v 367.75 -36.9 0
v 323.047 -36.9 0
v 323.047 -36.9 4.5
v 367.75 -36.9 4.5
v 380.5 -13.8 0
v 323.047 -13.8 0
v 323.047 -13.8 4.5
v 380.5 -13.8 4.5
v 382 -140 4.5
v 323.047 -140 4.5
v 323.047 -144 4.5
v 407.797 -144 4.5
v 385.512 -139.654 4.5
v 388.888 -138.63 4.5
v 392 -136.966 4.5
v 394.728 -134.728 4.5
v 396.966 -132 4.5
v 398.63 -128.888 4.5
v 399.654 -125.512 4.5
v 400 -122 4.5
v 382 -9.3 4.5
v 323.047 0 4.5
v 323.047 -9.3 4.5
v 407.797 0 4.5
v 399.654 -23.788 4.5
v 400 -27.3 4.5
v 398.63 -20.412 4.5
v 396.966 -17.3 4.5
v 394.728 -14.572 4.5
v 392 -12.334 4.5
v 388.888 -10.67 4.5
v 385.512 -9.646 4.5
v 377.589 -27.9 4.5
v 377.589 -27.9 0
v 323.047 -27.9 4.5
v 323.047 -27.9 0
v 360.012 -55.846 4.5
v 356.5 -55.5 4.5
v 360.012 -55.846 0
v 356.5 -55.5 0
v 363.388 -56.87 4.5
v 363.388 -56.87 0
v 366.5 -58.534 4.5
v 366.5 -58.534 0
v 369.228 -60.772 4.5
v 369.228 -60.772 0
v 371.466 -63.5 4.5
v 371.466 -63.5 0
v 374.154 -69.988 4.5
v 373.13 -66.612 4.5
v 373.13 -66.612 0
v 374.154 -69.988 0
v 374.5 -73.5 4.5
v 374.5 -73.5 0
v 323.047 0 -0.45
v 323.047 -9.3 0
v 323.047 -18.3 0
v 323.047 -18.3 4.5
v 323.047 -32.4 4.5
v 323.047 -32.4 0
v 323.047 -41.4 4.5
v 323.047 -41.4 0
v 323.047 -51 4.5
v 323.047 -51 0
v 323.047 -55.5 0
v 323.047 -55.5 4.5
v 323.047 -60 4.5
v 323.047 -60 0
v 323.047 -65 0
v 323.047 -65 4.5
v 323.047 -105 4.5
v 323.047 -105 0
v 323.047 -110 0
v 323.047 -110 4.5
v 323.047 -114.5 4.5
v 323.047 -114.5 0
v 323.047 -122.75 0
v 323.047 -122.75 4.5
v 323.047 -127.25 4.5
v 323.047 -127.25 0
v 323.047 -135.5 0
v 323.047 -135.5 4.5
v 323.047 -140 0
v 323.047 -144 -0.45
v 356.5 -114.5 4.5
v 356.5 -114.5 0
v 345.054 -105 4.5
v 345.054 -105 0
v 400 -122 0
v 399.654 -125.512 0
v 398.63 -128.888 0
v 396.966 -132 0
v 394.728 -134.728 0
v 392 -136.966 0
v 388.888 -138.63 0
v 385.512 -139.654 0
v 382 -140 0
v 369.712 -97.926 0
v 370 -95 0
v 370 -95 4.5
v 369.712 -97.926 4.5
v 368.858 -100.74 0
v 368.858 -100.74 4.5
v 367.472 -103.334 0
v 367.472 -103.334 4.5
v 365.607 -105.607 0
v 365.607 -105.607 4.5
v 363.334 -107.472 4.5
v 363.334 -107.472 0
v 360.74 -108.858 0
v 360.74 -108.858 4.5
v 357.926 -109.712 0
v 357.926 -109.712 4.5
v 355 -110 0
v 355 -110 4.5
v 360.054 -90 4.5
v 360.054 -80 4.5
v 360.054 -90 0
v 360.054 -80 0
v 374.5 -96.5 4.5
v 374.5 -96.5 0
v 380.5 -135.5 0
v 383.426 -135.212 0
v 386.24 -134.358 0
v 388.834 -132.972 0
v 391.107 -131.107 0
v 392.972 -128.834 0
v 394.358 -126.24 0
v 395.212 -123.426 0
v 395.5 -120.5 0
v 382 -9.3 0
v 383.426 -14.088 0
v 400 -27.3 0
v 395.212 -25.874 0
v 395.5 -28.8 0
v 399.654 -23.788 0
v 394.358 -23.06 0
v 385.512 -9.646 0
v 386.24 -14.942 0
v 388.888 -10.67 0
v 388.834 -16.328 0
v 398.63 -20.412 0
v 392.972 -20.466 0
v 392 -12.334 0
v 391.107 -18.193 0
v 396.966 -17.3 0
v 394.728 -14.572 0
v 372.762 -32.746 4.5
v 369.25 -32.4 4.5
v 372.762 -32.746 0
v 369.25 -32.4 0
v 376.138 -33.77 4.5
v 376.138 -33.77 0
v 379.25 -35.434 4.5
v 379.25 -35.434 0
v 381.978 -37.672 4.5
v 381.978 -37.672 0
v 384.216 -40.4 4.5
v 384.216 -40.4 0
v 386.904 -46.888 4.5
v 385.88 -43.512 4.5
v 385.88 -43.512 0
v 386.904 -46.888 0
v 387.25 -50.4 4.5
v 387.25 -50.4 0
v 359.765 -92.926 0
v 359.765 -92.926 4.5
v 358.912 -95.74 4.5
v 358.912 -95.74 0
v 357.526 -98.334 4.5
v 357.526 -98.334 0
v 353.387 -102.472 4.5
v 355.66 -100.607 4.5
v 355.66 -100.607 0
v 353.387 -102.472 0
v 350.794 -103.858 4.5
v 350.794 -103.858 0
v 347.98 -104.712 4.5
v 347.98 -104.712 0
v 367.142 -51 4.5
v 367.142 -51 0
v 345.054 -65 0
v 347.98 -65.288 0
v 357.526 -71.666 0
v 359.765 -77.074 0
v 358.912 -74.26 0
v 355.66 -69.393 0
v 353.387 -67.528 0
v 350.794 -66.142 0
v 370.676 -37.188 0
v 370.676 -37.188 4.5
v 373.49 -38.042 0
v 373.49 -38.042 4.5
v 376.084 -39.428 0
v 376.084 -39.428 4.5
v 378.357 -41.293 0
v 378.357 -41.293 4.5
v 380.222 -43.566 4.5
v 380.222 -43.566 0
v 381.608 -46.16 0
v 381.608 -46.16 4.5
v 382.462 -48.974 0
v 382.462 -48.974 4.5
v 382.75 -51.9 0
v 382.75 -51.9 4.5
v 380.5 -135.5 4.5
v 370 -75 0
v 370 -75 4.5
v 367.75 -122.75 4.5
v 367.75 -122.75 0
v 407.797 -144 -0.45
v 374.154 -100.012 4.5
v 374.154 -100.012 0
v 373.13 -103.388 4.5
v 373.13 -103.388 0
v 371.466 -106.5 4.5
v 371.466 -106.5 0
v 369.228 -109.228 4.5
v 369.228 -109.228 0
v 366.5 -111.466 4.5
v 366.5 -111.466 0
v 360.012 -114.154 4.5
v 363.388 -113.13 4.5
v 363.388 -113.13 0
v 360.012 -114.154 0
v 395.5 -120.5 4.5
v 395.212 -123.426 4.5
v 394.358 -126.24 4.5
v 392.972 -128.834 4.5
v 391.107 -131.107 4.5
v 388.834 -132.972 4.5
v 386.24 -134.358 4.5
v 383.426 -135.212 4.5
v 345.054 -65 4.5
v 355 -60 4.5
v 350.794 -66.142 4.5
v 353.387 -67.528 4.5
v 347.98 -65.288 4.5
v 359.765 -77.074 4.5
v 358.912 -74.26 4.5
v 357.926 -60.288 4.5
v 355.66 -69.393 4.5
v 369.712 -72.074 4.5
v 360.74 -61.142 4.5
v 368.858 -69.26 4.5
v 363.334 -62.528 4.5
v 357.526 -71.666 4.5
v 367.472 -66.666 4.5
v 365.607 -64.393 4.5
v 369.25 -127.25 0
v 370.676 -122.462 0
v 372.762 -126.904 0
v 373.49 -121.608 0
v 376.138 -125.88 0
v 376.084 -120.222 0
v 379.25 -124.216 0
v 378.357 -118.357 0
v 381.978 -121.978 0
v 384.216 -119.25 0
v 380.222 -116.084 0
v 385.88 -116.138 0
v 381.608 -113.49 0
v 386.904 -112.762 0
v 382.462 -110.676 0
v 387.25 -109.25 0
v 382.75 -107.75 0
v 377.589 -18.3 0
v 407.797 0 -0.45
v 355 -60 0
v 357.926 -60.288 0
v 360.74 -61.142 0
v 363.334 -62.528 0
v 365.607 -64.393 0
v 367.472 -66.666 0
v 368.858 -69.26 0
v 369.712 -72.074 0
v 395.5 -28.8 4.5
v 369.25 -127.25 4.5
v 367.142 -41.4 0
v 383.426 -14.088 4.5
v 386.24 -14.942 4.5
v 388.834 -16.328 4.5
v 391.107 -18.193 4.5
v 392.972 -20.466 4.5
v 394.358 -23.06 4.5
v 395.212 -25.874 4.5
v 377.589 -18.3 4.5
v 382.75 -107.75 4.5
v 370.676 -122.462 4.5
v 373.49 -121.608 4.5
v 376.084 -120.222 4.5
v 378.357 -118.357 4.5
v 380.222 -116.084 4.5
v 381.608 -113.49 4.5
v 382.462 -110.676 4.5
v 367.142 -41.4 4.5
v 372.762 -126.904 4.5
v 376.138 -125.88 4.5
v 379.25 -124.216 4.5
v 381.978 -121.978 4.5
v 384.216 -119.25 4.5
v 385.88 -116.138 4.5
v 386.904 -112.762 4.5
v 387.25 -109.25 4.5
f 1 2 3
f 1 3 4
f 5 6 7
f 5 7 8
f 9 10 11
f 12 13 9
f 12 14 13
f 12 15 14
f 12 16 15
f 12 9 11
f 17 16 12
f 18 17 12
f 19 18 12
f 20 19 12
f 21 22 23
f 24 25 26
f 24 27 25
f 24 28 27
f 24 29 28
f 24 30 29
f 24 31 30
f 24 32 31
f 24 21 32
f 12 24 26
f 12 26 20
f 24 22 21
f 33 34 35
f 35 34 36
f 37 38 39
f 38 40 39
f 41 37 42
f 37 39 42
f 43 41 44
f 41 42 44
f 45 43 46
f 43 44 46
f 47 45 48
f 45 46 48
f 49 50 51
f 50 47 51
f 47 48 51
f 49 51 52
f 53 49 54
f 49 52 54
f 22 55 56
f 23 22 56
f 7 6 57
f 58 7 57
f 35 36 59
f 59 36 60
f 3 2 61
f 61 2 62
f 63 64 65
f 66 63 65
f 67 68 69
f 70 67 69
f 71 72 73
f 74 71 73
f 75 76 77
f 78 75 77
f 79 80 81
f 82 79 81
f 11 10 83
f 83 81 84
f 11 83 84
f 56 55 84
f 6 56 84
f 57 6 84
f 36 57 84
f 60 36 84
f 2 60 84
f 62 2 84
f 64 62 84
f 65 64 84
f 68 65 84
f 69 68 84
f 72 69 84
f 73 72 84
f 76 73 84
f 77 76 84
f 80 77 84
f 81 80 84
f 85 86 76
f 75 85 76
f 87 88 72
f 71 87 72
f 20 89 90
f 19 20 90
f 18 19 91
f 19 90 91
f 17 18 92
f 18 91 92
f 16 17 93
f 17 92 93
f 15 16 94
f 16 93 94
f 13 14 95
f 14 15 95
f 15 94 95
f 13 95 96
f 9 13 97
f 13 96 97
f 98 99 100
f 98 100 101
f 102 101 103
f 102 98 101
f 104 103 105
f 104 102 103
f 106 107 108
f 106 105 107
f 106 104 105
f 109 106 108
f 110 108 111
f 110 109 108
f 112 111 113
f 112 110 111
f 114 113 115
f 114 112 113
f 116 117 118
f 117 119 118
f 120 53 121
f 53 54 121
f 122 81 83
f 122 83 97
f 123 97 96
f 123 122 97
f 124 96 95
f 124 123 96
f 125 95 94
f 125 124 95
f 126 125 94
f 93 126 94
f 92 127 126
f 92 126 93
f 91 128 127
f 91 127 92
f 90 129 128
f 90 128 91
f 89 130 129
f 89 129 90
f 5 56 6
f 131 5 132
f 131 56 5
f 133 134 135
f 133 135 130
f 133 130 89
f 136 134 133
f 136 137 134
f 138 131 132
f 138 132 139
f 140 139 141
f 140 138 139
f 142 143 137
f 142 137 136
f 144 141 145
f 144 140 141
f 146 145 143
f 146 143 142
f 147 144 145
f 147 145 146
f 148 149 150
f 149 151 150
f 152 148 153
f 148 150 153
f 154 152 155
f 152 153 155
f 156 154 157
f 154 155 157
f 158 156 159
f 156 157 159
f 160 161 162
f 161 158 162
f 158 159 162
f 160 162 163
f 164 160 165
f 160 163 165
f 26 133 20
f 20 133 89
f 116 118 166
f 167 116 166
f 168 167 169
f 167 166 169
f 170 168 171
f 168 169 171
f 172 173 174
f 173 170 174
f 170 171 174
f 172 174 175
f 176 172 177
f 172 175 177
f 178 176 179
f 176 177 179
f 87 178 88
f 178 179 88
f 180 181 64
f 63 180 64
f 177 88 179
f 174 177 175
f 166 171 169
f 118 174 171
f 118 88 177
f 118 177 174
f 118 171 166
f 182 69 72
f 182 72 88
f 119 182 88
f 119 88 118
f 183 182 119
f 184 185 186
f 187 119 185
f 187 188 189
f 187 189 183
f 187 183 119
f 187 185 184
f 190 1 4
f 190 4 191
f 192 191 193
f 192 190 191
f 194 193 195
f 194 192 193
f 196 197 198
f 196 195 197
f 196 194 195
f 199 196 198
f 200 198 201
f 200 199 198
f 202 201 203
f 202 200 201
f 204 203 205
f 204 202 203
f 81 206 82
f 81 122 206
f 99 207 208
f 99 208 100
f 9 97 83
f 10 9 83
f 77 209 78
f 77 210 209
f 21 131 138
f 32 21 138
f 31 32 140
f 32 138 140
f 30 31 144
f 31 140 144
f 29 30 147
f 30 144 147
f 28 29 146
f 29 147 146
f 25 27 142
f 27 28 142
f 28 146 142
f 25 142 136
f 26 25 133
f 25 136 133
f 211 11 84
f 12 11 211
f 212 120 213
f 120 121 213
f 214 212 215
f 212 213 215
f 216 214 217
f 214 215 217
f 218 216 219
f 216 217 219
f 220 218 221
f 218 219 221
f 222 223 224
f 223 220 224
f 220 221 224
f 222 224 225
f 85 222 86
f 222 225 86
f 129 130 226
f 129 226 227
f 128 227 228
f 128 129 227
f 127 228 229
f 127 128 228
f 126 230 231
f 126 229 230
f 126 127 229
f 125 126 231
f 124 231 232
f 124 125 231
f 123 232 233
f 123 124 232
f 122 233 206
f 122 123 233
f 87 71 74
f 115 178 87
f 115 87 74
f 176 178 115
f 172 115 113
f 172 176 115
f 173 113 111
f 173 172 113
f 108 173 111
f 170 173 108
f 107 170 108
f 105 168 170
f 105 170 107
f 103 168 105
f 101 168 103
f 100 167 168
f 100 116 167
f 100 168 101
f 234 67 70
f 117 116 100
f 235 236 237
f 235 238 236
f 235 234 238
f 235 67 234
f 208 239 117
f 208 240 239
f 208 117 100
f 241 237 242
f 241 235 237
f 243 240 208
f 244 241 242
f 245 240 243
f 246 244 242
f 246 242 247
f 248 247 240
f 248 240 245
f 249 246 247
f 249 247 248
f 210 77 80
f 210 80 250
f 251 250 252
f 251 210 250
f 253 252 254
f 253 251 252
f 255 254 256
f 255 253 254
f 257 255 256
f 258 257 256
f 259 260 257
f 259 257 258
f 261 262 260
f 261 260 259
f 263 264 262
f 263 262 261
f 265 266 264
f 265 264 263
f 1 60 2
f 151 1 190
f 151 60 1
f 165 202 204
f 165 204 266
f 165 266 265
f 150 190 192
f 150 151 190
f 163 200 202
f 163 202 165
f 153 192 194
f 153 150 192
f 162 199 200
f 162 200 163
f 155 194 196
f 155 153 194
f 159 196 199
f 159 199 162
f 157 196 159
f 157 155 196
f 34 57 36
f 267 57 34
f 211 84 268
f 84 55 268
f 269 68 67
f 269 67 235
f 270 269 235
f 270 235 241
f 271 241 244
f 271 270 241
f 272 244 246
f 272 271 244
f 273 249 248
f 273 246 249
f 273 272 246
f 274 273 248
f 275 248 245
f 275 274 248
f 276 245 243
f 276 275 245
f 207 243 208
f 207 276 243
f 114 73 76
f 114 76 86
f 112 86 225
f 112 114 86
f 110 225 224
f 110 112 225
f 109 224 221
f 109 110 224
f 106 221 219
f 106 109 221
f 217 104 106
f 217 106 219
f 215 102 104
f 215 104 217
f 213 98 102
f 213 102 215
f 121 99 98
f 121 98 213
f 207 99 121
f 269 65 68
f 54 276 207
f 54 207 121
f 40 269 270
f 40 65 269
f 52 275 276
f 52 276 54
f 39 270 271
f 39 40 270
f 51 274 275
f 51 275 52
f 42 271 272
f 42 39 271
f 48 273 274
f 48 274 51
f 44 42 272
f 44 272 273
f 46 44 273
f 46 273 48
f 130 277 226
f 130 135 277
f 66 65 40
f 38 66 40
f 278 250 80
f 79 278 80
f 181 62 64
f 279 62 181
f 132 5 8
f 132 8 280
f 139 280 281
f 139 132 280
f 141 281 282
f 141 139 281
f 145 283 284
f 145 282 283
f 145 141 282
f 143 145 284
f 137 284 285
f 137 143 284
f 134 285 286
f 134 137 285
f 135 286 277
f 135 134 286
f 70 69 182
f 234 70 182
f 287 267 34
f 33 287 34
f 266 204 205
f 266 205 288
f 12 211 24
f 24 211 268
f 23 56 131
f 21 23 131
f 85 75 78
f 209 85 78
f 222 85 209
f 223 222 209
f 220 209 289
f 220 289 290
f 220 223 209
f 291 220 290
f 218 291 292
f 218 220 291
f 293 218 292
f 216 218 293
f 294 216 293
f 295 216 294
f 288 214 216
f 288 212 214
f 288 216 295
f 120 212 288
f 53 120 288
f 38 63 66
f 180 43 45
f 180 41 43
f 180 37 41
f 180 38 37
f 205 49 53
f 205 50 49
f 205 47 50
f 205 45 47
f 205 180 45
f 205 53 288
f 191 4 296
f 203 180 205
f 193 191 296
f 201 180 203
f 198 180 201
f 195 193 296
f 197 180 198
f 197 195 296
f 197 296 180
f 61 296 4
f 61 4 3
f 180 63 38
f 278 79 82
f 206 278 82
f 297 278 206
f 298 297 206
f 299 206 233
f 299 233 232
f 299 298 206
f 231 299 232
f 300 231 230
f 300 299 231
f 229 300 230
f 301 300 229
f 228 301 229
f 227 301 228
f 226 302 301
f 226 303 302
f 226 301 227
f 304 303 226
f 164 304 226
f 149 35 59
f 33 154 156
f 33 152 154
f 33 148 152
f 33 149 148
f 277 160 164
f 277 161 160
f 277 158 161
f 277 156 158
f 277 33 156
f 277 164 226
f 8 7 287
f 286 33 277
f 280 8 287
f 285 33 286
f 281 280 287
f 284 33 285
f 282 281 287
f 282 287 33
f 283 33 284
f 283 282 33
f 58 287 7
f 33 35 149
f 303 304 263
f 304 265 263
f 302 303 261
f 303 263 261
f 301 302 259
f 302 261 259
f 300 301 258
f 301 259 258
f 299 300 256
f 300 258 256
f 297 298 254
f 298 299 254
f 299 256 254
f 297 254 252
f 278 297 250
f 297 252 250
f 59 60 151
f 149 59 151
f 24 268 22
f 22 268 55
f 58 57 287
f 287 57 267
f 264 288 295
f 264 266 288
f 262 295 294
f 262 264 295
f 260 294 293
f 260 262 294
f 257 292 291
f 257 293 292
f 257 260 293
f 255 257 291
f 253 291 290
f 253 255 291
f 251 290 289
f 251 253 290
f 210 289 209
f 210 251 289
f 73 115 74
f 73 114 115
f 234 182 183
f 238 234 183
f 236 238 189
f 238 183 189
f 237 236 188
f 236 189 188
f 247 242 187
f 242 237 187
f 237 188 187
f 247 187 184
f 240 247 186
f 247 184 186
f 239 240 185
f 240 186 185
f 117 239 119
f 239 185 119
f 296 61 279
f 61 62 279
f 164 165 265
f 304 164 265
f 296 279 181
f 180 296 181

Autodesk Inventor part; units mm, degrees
ref_plane "YZ Plane" through (0, 0, 0) normal (1, 0, 0) x (0, 1, 0)
sketch "Sketch1" plane through (0, 0, 0) normal (0, 0, 1) x (1, 0, 0)
  line L0 (-5, -9.3) -> (382, -9.3)
  line L1 (400, -27.3) -> (400, -122)
  line L2 (382, -140) -> (-400, -140)
  line L3 (-400, -140) -> (-400, -32.4)
  line L4 (-5, -9.3) -> (-5, -13.8)
  line L5 (-5, -13.8) -> (380.5, -13.8)
  line L6 (395.5, -28.8) -> (395.5, -120.5)
  line L7 (380.5, -135.5) -> (-395.5, -135.5)
  line L8 (-400, -32.4) -> (369.25, -32.4)
  line L9 (387.25, -50.4) -> (387.25, -109.25)
  line L10 (369.25, -127.25) -> (-387.25, -127.25)
  line L11 (-395.5, -135.5) -> (-395.5, -36.9)
  line L12 (-395.5, -36.9) -> (367.75, -36.9)
  line L13 (382.75, -51.9) -> (382.75, -107.75)
  line L14 (367.75, -122.75) -> (-382.75, -122.75)
  line L15 (-382.75, -122.75) -> (-382.75, -60)
  line L16 (-387.25, -127.25) -> (-387.25, -55.5)
  line L17 (-387.25, -55.5) -> (356.5, -55.5)
  line L18 (374.5, -73.5) -> (374.5, -96.5)
  line L19 (-382.75, -60) -> (355, -60)
  line L20 (370, -75) -> (370, -95)
  line L21 (355, -110) -> (-374.5, -110)
  line L22 (356.5, -114.5) -> (-374.5, -114.5)
  line L23 (-374.5, -114.5) -> (-374.5, -110)
  line L24 (323.0472, -144) -> (407.7972, -144)
  line L25 (407.7972, -144) -> (407.7972, 0)
  line L26 (407.7972, 0) -> (323.0472, 0)
  line L27 (-561.5594, 0) -> (569.3566, 0) projected
  line L28 (323.0472, -65) -> (345.0535, -65)
  line L29 (360.0535, -80) -> (360.0535, -90)
  line L30 (345.0535, -105) -> (323.0472, -105)
  arc A0 (360.0535, -67) -> (358.0535, -65) centre (358.0535, -67) ccw
  arc A1 (360.0535, -80) -> (345.0535, -65) centre (345.0535, -80) ccw
  arc A2 (345.0535, -105) -> (360.0535, -90) centre (345.0535, -90) ccw
  line L31 (323.0472, -18.3) -> (377.5888, -18.3)
  line L32 (377.5888, -18.3) -> (377.5888, -27.9)
  line L33 (377.5888, -27.9) -> (323.0472, -27.9)
  line L34 (323.0472, -41.4) -> (367.1423, -41.4)
  line L35 (367.1423, -41.4) -> (367.1423, -51)
  line L36 (367.1423, -51) -> (323.0472, -51)
  arc A3 (395.5, -28.8) -> (380.5, -13.8) centre (380.5, -28.8) ccw
  arc A4 (382.75, -51.9) -> (367.75, -36.9) centre (367.75, -51.9) ccw
  arc A5 (370, -75) -> (355, -60) centre (355, -75) ccw
  arc A6 (355, -110) -> (370, -95) centre (355, -95) ccw
  arc A7 (367.75, -122.75) -> (382.75, -107.75) centre (367.75, -107.75) ccw
  arc A8 (380.5, -135.5) -> (395.5, -120.5) centre (380.5, -120.5) ccw
  arc A9 (400, -27.3) -> (382, -9.3) centre (382, -27.3) ccw
  arc A10 (387.25, -50.4) -> (369.25, -32.4) centre (369.25, -50.4) ccw
  arc A11 (374.5, -73.5) -> (356.5, -55.5) centre (356.5, -73.5) ccw
  arc A12 (356.5, -114.5) -> (374.5, -96.5) centre (356.5, -96.5) ccw
  arc A13 (369.25, -127.25) -> (387.25, -109.25) centre (369.25, -109.25) ccw
  arc A14 (382, -140) -> (400, -122) centre (382, -122) ccw
  line L37 (323.0472, 0) -> (323.0472, -144)
  point P0 (0, 0)
  point P1 (400, -9.3)
  point P2 (400, -140)
  point P3 (395.5, -13.8)
  point P4 (395.5, -135.5)
  point P5 (387.25, -32.4)
  point P6 (387.25, -127.25)
  point P7 (382.75, -36.9)
  point P8 (382.75, -122.75)
  point P9 (374.5, -55.5)
  point P10 (374.5, -114.5)
  point P11 (370, -60)
  point P12 (370, -110)
  point P13 (0, 0)
  point P14 (400, -9.3)
  point P15 (400, -9.3)
  point P16 (400, -9.3)
  point P17 (395.5, -13.8)
  point P18 (395.5, -13.8)
  point P19 (395.5, -13.8)
  point P20 (387.25, -32.4)
  point P21 (387.25, -32.4)
  point P22 (387.25, -32.4)
  point P23 (382.75, -36.9)
  point P24 (382.75, -36.9)
  point P25 (382.75, -36.9)
  point P26 (374.5, -55.5)
  point P27 (374.5, -55.5)
  point P28 (374.5, -55.5)
  point P29 (370, -60)
  point P30 (370, -60)
  point P31 (370, -60)
  point P32 (370, -110)
  point P33 (370, -110)
  point P34 (370, -110)
  point P35 (374.5, -114.5)
  point P36 (374.5, -114.5)
  point P37 (374.5, -114.5)
  point P38 (382.75, -122.75)
  point P39 (382.75, -122.75)
  point P40 (382.75, -122.75)
  point P41 (387.25, -127.25)
  point P42 (387.25, -127.25)
  point P43 (387.25, -127.25)
  point P44 (395.5, -135.5)
  point P45 (395.5, -135.5)
  point P46 (395.5, -135.5)
  point P47 (400, -140)
  point P48 (400, -140)
  point P49 (400, -140)
  point P50 (360.0535, -65)
  point P51 (360.0535, -105)
  point P52 (323.0472, -13.8)
  point P53 (323.0472, -9.3)
  point P54 (323.0472, -36.9)
  point P55 (323.0472, -32.4)
  point P56 (323.0472, -140)
  point P57 (323.0472, -135.5)
  point P58 (323.0472, -110)
  point P59 (323.0472, -60)
  point P60 (323.0472, -122.75)
  point P61 (323.0472, -114.5)
  point P62 (323.0472, -55.5)
  point P63 (323.0472, -127.25)
  dimension "d91" = 0
  dimension "d1" = 4.5
  dimension "d2" = 4.5
  dimension "d3" = 4.5
  dimension "d5" = 800
  dimension "d6" = 400
  dimension "d7" = 4.5
  dimension "d8" = 4.5
  dimension "d9" = 8.25
  dimension "d10" = 4.5
  dimension "d11" = 18.6
  dimension "d12" = 4.5
  dimension "d13" = 8.25
  dimension "d14" = 4.5
  dimension "d15" = 4.5
  dimension "d16" = 4.5
  dimension "d17" = 8.25
  dimension "d19" = 18.6
  dimension "d20" = 8.25
  dimension "d88" = 4.5
  dimension "d89" = 8.25
  dimension "d90" = 8.25
  dimension "d106" = 144
  dimension "d111" = 5
  dimension "d112" = 5
  dimension "d113" = 2
  dimension "d114" = 15
  dimension "d115" = 4.5
  dimension "d116" = 4.5
  dimension "d117" = 4.5
  dimension "d118" = 4.5
  dimension "d119" = 140
  dimension "d120" = 9.3
  dimension "d121" = 15
  dimension "d122" = 18
extrude "Extrusion1" add sketch "Sketch1" along normal blind 4.5 contours L37 L26 L25 L24 L2 A14 L1 A9 L0 | L5 A3 L6 A8 L7 L37 L10 A13 L9 A10 L8 L33 L32 L31 | L12 A4 L13 A7 L14 L37 L22 A12 L18 A11 L17 L36 L35 L34 | L19 A5 L20 A6 L21 L37 L30 A2 L29 A1 L28
extrude "Extrusion7" add sketch "Sketch1" against normal blind 0.45 contours L37 L26 L25 L24 L2 A14 L1 A9 L0 | L0 A9 L1 A14 L2 L37 L7 A8 L6 A3 L5 | L5 A3 L6 A8 L7 L37 L10 A13 L9 A10 L8 L33 L32 L31 | L31 L32 L33 L37 | L8 A10 L9 A13 L10 L37 L14 A7 L13 A4 L12 | L12 A4 L13 A7 L14 L37 L22 A12 L18 A11 L17 L36 L35 L34 | L34 L35 L36 L37 | L17 A11 L18 A12 L22 L37 L21 A6 L20 A5 L19 | L19 A5 L20 A6 L21 L37 L30 A2 L29 A1 L28 | L28 A1 L29 A2 L30 L37
equation "\"d1\" = wire_diameter"
equation "\"d2\" = wire_diameter"
equation "\"d3\" = wire_diameter"
equation "\"d5\" = track_length"
equation "\"d6\" = 0.5 * track_length"
equation "\"d7\" = wire_diameter"
equation "\"d8\" = wire_diameter"
equation "\"d9\" = distance_between_wires_edge"
equation "\"d10\" = wire_diameter"
equation "\"d11\" = distance_between_wires"
equation "\"d12\" = wire_diameter"
equation "\"d13\" = distance_between_wires_edge"
equation "\"d14\" = wire_diameter"
equation "\"d15\" = wire_diameter"
equation "\"d16\" = wire_diameter"
equation "\"d17\" = distance_between_wires_edge"
equation "\"d19\" = distance_between_wires"
equation "\"d20\" = distance_between_wires_edge"
equation "\"d22\" = wire_diameter"
equation "\"track_length\" = 800"
equation "\"wire_diameter\" = 4.5"
equation "\"distance_between_wires\" = -1.2 * wire_diameter + 0.2 * parameter_6"
equation "\"distance_between_wires_edge\" = 8.25"
equation "\"bend_radius\" = 15"
equation "\"bend_radius_outer\" = 18"
equation "\"parameter_6\" = 120"
properties part number "primary_coil_0R2_test_cut"
